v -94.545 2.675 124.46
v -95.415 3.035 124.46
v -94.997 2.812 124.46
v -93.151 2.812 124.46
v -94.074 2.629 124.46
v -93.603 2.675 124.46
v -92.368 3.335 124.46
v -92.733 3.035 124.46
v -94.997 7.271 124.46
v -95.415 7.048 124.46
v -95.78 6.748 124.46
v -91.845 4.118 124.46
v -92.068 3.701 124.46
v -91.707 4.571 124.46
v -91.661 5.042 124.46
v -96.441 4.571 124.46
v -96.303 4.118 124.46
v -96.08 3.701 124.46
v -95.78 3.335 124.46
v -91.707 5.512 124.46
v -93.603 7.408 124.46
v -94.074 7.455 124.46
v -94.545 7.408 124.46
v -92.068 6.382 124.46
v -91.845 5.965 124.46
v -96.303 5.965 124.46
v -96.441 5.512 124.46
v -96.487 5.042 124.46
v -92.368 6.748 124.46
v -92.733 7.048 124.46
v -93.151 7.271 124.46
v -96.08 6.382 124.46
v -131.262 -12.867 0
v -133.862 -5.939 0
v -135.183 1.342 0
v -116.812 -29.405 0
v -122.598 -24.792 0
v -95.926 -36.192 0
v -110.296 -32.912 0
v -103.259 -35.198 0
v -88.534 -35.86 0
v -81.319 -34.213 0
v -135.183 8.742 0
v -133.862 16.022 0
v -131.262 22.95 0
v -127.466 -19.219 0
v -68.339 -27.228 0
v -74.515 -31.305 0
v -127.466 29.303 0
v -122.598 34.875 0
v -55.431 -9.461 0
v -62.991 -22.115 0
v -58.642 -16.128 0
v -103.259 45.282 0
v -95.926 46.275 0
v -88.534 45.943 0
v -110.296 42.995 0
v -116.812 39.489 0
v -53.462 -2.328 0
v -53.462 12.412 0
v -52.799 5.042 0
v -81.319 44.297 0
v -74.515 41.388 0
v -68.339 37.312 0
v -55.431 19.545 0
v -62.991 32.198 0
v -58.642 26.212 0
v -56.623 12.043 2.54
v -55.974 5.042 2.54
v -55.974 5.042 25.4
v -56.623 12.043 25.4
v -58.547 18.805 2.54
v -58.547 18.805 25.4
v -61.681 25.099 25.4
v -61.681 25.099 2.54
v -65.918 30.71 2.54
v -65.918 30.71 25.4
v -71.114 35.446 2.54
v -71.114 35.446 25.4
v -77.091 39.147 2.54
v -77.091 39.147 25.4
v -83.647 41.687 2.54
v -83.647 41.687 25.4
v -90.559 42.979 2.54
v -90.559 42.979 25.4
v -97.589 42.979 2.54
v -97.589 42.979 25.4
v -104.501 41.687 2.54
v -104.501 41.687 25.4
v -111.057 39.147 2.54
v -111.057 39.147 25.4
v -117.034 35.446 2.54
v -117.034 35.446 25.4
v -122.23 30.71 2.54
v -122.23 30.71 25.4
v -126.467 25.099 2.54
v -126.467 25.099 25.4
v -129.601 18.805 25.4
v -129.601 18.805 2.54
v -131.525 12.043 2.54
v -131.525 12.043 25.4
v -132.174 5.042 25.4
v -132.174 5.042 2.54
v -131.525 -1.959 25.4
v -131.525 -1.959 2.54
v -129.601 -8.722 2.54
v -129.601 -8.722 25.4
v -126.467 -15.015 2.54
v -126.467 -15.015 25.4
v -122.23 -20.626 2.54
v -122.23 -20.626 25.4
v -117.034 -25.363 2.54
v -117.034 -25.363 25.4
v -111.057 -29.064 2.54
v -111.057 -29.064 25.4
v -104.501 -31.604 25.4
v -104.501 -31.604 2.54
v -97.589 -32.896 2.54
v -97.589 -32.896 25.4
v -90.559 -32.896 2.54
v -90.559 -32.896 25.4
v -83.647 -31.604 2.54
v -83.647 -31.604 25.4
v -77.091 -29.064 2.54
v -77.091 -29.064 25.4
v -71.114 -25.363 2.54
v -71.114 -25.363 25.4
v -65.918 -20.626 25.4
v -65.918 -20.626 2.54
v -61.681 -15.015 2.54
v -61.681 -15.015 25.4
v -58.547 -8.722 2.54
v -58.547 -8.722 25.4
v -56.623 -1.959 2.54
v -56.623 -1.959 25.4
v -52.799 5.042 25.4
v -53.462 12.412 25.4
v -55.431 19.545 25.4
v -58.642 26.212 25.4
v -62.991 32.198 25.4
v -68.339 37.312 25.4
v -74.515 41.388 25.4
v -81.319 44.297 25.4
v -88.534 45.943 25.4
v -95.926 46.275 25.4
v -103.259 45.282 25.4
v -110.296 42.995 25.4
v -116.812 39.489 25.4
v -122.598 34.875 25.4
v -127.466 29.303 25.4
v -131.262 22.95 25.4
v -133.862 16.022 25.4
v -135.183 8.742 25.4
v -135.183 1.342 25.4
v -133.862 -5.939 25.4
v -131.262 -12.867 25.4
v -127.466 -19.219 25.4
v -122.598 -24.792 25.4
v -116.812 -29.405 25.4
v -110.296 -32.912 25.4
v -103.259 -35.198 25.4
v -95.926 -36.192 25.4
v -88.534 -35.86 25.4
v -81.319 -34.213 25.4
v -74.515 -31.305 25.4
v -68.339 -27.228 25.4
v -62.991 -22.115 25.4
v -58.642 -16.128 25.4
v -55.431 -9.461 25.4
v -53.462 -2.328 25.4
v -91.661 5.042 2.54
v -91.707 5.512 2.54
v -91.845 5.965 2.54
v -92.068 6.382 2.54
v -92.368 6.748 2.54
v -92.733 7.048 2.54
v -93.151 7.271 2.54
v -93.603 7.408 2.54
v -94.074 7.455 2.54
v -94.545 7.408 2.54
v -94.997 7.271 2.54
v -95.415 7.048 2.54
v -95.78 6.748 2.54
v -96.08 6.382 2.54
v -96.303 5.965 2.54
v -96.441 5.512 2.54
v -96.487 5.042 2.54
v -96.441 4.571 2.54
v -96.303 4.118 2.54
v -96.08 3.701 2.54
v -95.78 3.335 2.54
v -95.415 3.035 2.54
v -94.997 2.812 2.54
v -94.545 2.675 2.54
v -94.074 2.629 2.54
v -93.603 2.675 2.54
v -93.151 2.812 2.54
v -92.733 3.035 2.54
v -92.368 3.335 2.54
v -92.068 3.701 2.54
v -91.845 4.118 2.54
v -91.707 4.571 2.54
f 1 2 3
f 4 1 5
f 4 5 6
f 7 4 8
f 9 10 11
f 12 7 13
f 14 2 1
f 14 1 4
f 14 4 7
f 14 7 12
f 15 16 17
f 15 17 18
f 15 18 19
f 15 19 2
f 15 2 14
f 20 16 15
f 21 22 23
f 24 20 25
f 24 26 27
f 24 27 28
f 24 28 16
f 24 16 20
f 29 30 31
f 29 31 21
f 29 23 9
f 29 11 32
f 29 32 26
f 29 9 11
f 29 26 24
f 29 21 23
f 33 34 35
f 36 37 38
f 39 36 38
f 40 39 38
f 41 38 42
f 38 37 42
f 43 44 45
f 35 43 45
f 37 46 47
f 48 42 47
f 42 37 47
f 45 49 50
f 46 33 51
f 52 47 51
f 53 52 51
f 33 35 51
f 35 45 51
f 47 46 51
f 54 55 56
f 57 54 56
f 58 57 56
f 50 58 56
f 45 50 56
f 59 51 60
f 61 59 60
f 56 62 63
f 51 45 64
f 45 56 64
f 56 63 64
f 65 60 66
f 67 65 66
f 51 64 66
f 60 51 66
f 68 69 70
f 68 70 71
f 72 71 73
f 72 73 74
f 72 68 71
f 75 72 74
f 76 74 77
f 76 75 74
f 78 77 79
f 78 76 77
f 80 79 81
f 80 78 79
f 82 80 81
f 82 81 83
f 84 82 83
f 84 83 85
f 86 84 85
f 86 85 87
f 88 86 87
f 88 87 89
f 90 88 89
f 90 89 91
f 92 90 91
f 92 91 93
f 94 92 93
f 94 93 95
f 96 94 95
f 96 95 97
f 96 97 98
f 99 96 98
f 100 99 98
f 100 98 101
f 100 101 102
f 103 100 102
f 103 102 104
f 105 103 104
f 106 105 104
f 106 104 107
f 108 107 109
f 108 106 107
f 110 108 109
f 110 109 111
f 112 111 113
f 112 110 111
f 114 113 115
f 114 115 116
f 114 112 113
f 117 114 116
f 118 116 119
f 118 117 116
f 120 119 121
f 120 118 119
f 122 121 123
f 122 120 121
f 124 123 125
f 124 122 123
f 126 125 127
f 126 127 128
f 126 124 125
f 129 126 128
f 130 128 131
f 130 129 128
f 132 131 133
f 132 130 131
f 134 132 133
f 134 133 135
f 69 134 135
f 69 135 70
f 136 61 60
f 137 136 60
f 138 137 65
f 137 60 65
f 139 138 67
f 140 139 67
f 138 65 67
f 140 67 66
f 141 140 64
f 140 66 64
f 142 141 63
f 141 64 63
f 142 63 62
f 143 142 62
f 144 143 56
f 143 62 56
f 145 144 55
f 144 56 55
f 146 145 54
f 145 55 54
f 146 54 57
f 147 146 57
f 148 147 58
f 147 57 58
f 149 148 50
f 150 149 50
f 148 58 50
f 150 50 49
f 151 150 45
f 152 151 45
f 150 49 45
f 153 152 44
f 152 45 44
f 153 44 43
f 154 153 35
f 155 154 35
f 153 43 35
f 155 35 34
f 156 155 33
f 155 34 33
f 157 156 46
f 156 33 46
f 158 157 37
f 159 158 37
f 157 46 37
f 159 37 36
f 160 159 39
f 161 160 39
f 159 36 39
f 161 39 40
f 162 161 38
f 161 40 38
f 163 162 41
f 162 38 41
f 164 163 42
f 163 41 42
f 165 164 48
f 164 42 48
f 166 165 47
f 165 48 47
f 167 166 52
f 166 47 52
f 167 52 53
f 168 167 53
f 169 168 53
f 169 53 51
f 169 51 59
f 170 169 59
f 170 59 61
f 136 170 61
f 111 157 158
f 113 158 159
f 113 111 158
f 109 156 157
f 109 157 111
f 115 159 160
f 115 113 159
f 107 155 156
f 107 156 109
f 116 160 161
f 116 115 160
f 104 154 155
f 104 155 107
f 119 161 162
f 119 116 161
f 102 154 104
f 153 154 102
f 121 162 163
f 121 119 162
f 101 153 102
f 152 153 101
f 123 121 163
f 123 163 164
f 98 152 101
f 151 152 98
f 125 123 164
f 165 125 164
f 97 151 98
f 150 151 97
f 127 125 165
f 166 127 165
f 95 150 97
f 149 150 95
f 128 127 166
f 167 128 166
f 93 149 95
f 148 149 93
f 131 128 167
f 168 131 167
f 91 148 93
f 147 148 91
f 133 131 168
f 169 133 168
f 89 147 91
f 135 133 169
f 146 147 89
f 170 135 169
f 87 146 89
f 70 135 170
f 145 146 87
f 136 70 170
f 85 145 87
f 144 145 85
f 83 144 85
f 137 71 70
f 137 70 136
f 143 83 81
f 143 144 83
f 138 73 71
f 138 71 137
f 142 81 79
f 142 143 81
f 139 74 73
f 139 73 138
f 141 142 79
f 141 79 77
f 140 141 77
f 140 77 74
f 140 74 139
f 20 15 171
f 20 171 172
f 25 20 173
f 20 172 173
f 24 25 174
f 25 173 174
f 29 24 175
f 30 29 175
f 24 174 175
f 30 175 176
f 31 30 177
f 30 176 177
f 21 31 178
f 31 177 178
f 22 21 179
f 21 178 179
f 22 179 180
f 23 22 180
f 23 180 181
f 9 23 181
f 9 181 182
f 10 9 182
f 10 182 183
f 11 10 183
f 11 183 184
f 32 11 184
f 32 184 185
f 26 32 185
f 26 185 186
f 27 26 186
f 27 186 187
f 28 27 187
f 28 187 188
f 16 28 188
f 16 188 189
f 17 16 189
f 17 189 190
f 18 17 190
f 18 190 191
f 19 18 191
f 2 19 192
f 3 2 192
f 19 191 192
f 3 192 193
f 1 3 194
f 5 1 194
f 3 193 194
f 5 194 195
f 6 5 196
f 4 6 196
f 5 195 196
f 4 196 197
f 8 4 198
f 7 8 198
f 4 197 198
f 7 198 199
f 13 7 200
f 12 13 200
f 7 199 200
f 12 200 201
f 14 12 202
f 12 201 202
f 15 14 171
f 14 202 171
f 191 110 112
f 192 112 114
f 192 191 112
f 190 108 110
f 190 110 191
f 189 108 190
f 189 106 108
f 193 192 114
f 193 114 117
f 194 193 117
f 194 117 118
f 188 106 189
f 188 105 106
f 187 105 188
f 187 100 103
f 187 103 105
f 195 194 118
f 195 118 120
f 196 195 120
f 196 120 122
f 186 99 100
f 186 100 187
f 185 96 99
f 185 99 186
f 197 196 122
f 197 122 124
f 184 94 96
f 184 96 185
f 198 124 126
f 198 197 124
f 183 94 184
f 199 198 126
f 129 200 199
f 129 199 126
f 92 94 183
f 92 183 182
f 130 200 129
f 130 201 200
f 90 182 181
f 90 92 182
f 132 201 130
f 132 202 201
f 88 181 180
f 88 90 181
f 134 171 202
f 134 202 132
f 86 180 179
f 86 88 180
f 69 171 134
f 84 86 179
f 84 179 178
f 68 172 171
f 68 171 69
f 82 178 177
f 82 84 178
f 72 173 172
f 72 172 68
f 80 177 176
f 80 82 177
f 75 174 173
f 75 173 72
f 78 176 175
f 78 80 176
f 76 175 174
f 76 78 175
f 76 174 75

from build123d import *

# Parameters (mm, degrees)
F0_R     = 38.1
F0_R_2   = 2.413
F1_DEPTH = 2.54
F0_R_3   = 41.275
F2_DEPTH = 25.4
F3_R     = 2.413
F4_DEPTH = 124.46


with BuildPart() as f1:
    # F0 (on Top) → F1 (new body)
    with BuildSketch(Plane.XY):
        with Locations((-94.074033, 5.041726)):
            Circle(F0_R)
        with Locations((-94.074033, 5.041726)):
            Circle(F0_R_2, mode=Mode.SUBTRACT)
    extrude(amount=F1_DEPTH)

    # F0 (on Top) → F2 (join)
    with BuildSketch(Plane.XY):
        with Locations((-94.074033, 5.041726)):
            Circle(F0_R_3)
        with Locations((-94.074033, 5.041726)):
            Circle(F0_R, mode=Mode.SUBTRACT)
    extrude(amount=F2_DEPTH)

    # F3 (on face) → F4 (join)
    with BuildSketch(Plane.XY):
        with Locations((-94.074033, 5.041726)):
            Circle(F3_R)
    extrude(amount=F4_DEPTH)


solid = f1.part
